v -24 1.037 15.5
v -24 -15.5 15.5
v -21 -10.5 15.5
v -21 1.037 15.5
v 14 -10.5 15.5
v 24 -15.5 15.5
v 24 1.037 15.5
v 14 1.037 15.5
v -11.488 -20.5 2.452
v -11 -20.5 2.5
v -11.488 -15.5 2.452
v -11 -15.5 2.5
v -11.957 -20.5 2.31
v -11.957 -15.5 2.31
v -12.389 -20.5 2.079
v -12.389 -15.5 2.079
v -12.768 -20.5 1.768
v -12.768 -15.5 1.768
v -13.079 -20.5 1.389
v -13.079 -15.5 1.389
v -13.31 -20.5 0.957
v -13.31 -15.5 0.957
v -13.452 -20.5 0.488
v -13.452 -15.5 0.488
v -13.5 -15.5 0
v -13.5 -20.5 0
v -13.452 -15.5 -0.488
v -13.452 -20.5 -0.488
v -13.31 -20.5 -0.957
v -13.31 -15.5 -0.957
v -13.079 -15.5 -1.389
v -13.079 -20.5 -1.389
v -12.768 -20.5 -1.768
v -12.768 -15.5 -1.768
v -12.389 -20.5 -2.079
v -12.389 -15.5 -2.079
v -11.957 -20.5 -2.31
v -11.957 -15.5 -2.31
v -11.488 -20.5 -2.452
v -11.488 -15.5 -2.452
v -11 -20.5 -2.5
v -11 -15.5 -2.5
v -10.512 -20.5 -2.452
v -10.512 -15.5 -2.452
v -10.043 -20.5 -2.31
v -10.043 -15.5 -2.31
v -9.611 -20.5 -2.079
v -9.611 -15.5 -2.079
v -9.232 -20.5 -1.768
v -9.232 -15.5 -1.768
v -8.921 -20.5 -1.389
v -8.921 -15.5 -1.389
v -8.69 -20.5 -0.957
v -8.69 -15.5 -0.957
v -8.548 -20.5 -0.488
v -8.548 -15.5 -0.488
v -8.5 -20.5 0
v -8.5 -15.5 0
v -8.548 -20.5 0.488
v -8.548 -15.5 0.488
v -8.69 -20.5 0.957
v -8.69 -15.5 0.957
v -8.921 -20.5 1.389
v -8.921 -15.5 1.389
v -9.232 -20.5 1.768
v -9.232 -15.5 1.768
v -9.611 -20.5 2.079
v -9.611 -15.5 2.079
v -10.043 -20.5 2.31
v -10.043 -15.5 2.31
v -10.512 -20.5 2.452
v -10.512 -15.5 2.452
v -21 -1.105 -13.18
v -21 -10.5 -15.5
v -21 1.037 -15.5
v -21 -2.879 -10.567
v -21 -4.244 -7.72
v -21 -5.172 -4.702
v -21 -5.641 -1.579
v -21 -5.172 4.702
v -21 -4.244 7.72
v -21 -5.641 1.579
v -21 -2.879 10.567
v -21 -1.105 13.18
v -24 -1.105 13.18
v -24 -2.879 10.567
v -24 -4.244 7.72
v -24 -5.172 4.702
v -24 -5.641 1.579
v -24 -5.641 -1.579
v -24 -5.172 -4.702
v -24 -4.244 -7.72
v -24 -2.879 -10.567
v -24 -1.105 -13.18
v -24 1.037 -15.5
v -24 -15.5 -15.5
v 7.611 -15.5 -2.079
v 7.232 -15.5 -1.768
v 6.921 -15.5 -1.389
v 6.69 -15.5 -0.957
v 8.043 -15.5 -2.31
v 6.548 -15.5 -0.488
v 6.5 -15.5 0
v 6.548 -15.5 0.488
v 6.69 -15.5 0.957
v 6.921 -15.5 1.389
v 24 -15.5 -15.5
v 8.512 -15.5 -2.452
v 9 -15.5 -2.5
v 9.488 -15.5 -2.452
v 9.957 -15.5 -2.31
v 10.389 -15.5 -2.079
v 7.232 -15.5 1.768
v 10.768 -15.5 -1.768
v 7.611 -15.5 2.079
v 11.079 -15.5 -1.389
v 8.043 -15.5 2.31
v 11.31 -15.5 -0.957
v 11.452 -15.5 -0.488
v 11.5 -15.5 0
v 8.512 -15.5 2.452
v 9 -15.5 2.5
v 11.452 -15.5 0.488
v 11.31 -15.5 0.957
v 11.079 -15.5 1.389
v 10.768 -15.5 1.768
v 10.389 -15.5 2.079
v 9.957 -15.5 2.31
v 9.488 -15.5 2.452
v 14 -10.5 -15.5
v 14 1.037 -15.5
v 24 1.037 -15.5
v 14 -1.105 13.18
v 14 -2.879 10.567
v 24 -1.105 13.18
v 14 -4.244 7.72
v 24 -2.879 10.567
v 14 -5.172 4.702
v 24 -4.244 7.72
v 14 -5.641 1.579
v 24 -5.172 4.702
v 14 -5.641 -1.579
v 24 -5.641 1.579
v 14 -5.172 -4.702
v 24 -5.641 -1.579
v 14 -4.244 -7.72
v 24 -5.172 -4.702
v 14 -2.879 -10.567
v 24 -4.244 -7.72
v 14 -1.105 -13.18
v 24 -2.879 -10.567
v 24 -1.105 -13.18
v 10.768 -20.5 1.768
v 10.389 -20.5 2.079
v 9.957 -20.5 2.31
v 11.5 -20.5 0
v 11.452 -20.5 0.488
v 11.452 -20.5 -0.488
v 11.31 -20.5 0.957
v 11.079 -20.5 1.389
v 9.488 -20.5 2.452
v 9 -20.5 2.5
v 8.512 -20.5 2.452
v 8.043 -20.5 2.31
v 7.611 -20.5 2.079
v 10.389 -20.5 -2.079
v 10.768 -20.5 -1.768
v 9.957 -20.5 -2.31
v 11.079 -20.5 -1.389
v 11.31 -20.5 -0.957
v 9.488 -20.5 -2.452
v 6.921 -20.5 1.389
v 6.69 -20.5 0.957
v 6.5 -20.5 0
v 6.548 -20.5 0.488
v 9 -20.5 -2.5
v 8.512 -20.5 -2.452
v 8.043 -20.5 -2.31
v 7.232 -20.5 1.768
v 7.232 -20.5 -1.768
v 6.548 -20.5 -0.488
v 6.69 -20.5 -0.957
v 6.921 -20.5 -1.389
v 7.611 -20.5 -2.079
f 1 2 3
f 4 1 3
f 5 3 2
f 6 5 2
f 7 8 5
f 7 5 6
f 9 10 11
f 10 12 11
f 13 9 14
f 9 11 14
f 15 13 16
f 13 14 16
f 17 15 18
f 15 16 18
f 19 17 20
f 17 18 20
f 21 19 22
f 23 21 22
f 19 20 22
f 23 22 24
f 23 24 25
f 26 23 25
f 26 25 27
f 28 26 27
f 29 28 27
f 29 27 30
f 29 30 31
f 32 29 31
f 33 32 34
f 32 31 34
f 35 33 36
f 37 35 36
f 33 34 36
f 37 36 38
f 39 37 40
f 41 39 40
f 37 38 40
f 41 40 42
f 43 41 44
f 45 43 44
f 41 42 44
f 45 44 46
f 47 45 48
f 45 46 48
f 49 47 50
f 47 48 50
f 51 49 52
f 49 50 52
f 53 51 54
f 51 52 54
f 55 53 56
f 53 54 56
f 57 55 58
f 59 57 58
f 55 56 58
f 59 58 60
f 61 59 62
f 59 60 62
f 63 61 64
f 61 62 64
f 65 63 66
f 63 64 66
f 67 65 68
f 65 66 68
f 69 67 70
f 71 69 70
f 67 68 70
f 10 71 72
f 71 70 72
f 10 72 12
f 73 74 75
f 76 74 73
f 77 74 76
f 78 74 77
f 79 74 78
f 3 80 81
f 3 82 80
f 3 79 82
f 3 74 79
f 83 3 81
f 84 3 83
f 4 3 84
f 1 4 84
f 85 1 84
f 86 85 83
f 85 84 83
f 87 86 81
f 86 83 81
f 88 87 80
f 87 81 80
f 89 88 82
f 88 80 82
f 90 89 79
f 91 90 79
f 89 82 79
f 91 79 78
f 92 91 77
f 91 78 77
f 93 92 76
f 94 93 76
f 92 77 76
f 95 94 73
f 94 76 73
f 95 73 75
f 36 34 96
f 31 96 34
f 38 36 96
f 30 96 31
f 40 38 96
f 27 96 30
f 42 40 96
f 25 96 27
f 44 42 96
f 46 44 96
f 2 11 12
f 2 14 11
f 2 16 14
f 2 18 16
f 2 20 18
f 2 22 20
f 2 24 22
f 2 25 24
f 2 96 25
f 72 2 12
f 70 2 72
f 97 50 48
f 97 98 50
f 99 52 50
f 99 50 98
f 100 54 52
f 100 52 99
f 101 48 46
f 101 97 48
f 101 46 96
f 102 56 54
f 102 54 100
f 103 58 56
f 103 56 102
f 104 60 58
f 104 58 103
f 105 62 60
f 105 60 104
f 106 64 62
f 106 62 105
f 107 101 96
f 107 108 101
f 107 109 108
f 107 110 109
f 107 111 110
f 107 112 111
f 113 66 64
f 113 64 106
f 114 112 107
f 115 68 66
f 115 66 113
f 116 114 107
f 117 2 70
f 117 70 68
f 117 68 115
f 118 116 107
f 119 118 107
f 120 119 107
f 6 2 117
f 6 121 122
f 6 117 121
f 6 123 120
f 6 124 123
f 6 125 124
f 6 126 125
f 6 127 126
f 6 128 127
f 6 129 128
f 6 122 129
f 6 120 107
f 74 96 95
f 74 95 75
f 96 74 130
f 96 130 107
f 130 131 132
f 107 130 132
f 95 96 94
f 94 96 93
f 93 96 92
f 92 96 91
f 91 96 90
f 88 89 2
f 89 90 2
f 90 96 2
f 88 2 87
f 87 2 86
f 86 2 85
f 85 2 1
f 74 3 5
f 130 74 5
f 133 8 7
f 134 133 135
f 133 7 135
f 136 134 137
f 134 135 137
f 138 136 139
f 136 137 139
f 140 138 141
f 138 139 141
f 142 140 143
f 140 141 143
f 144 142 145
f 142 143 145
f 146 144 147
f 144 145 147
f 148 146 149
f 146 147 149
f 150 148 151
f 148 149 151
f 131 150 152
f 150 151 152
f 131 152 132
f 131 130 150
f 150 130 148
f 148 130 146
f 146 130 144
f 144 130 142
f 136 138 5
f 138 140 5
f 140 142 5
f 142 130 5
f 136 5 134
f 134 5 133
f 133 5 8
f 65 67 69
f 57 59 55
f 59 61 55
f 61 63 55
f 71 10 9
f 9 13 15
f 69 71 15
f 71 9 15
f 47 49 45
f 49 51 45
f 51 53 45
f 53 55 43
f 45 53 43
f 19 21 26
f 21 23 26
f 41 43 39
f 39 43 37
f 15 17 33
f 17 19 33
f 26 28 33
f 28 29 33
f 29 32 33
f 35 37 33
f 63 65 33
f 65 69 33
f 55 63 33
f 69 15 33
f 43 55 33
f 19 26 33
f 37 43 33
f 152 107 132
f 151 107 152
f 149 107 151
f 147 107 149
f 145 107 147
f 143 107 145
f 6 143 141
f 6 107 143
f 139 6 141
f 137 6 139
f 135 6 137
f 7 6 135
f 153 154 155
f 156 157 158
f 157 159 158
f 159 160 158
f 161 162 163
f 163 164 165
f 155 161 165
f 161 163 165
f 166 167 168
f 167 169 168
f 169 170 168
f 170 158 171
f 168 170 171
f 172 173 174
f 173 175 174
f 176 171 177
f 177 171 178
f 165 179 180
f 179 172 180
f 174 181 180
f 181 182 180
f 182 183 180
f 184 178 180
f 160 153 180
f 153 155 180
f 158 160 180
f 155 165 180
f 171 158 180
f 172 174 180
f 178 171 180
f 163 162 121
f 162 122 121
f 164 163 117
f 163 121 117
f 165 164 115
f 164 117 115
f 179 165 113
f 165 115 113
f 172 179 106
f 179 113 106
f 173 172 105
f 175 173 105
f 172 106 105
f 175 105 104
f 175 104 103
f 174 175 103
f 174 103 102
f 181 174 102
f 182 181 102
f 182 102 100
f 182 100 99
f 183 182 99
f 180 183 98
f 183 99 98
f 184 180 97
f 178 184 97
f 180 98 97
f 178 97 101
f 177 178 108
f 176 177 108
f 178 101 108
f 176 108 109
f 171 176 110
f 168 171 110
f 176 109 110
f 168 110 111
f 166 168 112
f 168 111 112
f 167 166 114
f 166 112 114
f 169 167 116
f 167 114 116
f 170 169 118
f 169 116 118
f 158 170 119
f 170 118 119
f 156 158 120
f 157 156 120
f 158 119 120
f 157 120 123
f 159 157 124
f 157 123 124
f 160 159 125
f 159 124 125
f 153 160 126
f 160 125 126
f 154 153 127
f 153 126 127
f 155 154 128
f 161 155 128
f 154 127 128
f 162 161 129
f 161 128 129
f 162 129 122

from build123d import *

# Parameters (mm, degrees)
SCHIZZO1_W                   = 48
SCHIZZO1_H                   = 31
ESTRUSIONE_ESTRUSIONE1_DEPTH = 15.5
TAGLIO_ESTRUSIONE1_REACH     = 44.157
SCHIZZO2_W                   = 35
SCHIZZO2_H                   = 26
SCHIZZO3_R                   = 21.2
TAGLIO_ESTRUSIONE2_DEPTH     = 53.768361733
SCHIZZO5_W                   = 2.5
SCHIZZO5_H                   = 5
RIPETIZIONE_A_L1_COUNT       = 2
RIPETIZIONE_A_L1_PITCH       = 20


with BuildPart() as part:
    # Schizzo1 → Estrusione-Estrusione1 (new, symmetric)
    with BuildSketch(Plane.XY):
        Rectangle(SCHIZZO1_W, SCHIZZO1_H)
    extrude(amount=ESTRUSIONE_ESTRUSIONE1_DEPTH, both=True)

    # Schizzo2 → Taglio-Estrusione1 (cut, up to next)
    with BuildSketch(Plane.XY.offset(15.5), mode=Mode.PRIVATE) as taglio_estrusione1_sk1:
        with Locations((-3.5, 2.5)):
            Rectangle(SCHIZZO2_W, SCHIZZO2_H)
    taglio_estrusione1_tool1 = extrude(taglio_estrusione1_sk1.sketch, amount=-TAGLIO_ESTRUSIONE1_REACH, mode=Mode.PRIVATE) & part.part
    add(taglio_estrusione1_tool1.solids().sort_by_distance((-3.5, 2.5, 15.5))[0], mode=Mode.SUBTRACT)

    # Schizzo3 → Taglio-Estrusione2 (cut, through all)
    with BuildSketch(Plane(origin=(24, 0, 0), x_dir=(0, 0, -1), z_dir=(1, 0, 0))):
        with Locations((0, 15.5)):
            Circle(SCHIZZO3_R)
    extrude(amount=-TAGLIO_ESTRUSIONE2_DEPTH, mode=Mode.SUBTRACT)

    # Schizzo5 → Rivoluzione2 (revolve)
    with BuildSketch(Plane.XY, mode=Mode.PRIVATE) as rivoluzione2_sk:
        with Locations((10.25, -18)):
            Rectangle(SCHIZZO5_W, SCHIZZO5_H)
    rivoluzione2 = revolve(rivoluzione2_sk.sketch.rotate(Axis((9, -15.5, 0), (0, -1, 0)), 90), axis=Axis((9, -15.5, 0), (0, -1, 0)))

    # Ripetizione a L1: Rivoluzione2 ×2
    with Locations(*[(-i * RIPETIZIONE_A_L1_PITCH, 0, 0) for i in range(1, RIPETIZIONE_A_L1_COUNT)]):
        add(rivoluzione2)


solid = part.part
